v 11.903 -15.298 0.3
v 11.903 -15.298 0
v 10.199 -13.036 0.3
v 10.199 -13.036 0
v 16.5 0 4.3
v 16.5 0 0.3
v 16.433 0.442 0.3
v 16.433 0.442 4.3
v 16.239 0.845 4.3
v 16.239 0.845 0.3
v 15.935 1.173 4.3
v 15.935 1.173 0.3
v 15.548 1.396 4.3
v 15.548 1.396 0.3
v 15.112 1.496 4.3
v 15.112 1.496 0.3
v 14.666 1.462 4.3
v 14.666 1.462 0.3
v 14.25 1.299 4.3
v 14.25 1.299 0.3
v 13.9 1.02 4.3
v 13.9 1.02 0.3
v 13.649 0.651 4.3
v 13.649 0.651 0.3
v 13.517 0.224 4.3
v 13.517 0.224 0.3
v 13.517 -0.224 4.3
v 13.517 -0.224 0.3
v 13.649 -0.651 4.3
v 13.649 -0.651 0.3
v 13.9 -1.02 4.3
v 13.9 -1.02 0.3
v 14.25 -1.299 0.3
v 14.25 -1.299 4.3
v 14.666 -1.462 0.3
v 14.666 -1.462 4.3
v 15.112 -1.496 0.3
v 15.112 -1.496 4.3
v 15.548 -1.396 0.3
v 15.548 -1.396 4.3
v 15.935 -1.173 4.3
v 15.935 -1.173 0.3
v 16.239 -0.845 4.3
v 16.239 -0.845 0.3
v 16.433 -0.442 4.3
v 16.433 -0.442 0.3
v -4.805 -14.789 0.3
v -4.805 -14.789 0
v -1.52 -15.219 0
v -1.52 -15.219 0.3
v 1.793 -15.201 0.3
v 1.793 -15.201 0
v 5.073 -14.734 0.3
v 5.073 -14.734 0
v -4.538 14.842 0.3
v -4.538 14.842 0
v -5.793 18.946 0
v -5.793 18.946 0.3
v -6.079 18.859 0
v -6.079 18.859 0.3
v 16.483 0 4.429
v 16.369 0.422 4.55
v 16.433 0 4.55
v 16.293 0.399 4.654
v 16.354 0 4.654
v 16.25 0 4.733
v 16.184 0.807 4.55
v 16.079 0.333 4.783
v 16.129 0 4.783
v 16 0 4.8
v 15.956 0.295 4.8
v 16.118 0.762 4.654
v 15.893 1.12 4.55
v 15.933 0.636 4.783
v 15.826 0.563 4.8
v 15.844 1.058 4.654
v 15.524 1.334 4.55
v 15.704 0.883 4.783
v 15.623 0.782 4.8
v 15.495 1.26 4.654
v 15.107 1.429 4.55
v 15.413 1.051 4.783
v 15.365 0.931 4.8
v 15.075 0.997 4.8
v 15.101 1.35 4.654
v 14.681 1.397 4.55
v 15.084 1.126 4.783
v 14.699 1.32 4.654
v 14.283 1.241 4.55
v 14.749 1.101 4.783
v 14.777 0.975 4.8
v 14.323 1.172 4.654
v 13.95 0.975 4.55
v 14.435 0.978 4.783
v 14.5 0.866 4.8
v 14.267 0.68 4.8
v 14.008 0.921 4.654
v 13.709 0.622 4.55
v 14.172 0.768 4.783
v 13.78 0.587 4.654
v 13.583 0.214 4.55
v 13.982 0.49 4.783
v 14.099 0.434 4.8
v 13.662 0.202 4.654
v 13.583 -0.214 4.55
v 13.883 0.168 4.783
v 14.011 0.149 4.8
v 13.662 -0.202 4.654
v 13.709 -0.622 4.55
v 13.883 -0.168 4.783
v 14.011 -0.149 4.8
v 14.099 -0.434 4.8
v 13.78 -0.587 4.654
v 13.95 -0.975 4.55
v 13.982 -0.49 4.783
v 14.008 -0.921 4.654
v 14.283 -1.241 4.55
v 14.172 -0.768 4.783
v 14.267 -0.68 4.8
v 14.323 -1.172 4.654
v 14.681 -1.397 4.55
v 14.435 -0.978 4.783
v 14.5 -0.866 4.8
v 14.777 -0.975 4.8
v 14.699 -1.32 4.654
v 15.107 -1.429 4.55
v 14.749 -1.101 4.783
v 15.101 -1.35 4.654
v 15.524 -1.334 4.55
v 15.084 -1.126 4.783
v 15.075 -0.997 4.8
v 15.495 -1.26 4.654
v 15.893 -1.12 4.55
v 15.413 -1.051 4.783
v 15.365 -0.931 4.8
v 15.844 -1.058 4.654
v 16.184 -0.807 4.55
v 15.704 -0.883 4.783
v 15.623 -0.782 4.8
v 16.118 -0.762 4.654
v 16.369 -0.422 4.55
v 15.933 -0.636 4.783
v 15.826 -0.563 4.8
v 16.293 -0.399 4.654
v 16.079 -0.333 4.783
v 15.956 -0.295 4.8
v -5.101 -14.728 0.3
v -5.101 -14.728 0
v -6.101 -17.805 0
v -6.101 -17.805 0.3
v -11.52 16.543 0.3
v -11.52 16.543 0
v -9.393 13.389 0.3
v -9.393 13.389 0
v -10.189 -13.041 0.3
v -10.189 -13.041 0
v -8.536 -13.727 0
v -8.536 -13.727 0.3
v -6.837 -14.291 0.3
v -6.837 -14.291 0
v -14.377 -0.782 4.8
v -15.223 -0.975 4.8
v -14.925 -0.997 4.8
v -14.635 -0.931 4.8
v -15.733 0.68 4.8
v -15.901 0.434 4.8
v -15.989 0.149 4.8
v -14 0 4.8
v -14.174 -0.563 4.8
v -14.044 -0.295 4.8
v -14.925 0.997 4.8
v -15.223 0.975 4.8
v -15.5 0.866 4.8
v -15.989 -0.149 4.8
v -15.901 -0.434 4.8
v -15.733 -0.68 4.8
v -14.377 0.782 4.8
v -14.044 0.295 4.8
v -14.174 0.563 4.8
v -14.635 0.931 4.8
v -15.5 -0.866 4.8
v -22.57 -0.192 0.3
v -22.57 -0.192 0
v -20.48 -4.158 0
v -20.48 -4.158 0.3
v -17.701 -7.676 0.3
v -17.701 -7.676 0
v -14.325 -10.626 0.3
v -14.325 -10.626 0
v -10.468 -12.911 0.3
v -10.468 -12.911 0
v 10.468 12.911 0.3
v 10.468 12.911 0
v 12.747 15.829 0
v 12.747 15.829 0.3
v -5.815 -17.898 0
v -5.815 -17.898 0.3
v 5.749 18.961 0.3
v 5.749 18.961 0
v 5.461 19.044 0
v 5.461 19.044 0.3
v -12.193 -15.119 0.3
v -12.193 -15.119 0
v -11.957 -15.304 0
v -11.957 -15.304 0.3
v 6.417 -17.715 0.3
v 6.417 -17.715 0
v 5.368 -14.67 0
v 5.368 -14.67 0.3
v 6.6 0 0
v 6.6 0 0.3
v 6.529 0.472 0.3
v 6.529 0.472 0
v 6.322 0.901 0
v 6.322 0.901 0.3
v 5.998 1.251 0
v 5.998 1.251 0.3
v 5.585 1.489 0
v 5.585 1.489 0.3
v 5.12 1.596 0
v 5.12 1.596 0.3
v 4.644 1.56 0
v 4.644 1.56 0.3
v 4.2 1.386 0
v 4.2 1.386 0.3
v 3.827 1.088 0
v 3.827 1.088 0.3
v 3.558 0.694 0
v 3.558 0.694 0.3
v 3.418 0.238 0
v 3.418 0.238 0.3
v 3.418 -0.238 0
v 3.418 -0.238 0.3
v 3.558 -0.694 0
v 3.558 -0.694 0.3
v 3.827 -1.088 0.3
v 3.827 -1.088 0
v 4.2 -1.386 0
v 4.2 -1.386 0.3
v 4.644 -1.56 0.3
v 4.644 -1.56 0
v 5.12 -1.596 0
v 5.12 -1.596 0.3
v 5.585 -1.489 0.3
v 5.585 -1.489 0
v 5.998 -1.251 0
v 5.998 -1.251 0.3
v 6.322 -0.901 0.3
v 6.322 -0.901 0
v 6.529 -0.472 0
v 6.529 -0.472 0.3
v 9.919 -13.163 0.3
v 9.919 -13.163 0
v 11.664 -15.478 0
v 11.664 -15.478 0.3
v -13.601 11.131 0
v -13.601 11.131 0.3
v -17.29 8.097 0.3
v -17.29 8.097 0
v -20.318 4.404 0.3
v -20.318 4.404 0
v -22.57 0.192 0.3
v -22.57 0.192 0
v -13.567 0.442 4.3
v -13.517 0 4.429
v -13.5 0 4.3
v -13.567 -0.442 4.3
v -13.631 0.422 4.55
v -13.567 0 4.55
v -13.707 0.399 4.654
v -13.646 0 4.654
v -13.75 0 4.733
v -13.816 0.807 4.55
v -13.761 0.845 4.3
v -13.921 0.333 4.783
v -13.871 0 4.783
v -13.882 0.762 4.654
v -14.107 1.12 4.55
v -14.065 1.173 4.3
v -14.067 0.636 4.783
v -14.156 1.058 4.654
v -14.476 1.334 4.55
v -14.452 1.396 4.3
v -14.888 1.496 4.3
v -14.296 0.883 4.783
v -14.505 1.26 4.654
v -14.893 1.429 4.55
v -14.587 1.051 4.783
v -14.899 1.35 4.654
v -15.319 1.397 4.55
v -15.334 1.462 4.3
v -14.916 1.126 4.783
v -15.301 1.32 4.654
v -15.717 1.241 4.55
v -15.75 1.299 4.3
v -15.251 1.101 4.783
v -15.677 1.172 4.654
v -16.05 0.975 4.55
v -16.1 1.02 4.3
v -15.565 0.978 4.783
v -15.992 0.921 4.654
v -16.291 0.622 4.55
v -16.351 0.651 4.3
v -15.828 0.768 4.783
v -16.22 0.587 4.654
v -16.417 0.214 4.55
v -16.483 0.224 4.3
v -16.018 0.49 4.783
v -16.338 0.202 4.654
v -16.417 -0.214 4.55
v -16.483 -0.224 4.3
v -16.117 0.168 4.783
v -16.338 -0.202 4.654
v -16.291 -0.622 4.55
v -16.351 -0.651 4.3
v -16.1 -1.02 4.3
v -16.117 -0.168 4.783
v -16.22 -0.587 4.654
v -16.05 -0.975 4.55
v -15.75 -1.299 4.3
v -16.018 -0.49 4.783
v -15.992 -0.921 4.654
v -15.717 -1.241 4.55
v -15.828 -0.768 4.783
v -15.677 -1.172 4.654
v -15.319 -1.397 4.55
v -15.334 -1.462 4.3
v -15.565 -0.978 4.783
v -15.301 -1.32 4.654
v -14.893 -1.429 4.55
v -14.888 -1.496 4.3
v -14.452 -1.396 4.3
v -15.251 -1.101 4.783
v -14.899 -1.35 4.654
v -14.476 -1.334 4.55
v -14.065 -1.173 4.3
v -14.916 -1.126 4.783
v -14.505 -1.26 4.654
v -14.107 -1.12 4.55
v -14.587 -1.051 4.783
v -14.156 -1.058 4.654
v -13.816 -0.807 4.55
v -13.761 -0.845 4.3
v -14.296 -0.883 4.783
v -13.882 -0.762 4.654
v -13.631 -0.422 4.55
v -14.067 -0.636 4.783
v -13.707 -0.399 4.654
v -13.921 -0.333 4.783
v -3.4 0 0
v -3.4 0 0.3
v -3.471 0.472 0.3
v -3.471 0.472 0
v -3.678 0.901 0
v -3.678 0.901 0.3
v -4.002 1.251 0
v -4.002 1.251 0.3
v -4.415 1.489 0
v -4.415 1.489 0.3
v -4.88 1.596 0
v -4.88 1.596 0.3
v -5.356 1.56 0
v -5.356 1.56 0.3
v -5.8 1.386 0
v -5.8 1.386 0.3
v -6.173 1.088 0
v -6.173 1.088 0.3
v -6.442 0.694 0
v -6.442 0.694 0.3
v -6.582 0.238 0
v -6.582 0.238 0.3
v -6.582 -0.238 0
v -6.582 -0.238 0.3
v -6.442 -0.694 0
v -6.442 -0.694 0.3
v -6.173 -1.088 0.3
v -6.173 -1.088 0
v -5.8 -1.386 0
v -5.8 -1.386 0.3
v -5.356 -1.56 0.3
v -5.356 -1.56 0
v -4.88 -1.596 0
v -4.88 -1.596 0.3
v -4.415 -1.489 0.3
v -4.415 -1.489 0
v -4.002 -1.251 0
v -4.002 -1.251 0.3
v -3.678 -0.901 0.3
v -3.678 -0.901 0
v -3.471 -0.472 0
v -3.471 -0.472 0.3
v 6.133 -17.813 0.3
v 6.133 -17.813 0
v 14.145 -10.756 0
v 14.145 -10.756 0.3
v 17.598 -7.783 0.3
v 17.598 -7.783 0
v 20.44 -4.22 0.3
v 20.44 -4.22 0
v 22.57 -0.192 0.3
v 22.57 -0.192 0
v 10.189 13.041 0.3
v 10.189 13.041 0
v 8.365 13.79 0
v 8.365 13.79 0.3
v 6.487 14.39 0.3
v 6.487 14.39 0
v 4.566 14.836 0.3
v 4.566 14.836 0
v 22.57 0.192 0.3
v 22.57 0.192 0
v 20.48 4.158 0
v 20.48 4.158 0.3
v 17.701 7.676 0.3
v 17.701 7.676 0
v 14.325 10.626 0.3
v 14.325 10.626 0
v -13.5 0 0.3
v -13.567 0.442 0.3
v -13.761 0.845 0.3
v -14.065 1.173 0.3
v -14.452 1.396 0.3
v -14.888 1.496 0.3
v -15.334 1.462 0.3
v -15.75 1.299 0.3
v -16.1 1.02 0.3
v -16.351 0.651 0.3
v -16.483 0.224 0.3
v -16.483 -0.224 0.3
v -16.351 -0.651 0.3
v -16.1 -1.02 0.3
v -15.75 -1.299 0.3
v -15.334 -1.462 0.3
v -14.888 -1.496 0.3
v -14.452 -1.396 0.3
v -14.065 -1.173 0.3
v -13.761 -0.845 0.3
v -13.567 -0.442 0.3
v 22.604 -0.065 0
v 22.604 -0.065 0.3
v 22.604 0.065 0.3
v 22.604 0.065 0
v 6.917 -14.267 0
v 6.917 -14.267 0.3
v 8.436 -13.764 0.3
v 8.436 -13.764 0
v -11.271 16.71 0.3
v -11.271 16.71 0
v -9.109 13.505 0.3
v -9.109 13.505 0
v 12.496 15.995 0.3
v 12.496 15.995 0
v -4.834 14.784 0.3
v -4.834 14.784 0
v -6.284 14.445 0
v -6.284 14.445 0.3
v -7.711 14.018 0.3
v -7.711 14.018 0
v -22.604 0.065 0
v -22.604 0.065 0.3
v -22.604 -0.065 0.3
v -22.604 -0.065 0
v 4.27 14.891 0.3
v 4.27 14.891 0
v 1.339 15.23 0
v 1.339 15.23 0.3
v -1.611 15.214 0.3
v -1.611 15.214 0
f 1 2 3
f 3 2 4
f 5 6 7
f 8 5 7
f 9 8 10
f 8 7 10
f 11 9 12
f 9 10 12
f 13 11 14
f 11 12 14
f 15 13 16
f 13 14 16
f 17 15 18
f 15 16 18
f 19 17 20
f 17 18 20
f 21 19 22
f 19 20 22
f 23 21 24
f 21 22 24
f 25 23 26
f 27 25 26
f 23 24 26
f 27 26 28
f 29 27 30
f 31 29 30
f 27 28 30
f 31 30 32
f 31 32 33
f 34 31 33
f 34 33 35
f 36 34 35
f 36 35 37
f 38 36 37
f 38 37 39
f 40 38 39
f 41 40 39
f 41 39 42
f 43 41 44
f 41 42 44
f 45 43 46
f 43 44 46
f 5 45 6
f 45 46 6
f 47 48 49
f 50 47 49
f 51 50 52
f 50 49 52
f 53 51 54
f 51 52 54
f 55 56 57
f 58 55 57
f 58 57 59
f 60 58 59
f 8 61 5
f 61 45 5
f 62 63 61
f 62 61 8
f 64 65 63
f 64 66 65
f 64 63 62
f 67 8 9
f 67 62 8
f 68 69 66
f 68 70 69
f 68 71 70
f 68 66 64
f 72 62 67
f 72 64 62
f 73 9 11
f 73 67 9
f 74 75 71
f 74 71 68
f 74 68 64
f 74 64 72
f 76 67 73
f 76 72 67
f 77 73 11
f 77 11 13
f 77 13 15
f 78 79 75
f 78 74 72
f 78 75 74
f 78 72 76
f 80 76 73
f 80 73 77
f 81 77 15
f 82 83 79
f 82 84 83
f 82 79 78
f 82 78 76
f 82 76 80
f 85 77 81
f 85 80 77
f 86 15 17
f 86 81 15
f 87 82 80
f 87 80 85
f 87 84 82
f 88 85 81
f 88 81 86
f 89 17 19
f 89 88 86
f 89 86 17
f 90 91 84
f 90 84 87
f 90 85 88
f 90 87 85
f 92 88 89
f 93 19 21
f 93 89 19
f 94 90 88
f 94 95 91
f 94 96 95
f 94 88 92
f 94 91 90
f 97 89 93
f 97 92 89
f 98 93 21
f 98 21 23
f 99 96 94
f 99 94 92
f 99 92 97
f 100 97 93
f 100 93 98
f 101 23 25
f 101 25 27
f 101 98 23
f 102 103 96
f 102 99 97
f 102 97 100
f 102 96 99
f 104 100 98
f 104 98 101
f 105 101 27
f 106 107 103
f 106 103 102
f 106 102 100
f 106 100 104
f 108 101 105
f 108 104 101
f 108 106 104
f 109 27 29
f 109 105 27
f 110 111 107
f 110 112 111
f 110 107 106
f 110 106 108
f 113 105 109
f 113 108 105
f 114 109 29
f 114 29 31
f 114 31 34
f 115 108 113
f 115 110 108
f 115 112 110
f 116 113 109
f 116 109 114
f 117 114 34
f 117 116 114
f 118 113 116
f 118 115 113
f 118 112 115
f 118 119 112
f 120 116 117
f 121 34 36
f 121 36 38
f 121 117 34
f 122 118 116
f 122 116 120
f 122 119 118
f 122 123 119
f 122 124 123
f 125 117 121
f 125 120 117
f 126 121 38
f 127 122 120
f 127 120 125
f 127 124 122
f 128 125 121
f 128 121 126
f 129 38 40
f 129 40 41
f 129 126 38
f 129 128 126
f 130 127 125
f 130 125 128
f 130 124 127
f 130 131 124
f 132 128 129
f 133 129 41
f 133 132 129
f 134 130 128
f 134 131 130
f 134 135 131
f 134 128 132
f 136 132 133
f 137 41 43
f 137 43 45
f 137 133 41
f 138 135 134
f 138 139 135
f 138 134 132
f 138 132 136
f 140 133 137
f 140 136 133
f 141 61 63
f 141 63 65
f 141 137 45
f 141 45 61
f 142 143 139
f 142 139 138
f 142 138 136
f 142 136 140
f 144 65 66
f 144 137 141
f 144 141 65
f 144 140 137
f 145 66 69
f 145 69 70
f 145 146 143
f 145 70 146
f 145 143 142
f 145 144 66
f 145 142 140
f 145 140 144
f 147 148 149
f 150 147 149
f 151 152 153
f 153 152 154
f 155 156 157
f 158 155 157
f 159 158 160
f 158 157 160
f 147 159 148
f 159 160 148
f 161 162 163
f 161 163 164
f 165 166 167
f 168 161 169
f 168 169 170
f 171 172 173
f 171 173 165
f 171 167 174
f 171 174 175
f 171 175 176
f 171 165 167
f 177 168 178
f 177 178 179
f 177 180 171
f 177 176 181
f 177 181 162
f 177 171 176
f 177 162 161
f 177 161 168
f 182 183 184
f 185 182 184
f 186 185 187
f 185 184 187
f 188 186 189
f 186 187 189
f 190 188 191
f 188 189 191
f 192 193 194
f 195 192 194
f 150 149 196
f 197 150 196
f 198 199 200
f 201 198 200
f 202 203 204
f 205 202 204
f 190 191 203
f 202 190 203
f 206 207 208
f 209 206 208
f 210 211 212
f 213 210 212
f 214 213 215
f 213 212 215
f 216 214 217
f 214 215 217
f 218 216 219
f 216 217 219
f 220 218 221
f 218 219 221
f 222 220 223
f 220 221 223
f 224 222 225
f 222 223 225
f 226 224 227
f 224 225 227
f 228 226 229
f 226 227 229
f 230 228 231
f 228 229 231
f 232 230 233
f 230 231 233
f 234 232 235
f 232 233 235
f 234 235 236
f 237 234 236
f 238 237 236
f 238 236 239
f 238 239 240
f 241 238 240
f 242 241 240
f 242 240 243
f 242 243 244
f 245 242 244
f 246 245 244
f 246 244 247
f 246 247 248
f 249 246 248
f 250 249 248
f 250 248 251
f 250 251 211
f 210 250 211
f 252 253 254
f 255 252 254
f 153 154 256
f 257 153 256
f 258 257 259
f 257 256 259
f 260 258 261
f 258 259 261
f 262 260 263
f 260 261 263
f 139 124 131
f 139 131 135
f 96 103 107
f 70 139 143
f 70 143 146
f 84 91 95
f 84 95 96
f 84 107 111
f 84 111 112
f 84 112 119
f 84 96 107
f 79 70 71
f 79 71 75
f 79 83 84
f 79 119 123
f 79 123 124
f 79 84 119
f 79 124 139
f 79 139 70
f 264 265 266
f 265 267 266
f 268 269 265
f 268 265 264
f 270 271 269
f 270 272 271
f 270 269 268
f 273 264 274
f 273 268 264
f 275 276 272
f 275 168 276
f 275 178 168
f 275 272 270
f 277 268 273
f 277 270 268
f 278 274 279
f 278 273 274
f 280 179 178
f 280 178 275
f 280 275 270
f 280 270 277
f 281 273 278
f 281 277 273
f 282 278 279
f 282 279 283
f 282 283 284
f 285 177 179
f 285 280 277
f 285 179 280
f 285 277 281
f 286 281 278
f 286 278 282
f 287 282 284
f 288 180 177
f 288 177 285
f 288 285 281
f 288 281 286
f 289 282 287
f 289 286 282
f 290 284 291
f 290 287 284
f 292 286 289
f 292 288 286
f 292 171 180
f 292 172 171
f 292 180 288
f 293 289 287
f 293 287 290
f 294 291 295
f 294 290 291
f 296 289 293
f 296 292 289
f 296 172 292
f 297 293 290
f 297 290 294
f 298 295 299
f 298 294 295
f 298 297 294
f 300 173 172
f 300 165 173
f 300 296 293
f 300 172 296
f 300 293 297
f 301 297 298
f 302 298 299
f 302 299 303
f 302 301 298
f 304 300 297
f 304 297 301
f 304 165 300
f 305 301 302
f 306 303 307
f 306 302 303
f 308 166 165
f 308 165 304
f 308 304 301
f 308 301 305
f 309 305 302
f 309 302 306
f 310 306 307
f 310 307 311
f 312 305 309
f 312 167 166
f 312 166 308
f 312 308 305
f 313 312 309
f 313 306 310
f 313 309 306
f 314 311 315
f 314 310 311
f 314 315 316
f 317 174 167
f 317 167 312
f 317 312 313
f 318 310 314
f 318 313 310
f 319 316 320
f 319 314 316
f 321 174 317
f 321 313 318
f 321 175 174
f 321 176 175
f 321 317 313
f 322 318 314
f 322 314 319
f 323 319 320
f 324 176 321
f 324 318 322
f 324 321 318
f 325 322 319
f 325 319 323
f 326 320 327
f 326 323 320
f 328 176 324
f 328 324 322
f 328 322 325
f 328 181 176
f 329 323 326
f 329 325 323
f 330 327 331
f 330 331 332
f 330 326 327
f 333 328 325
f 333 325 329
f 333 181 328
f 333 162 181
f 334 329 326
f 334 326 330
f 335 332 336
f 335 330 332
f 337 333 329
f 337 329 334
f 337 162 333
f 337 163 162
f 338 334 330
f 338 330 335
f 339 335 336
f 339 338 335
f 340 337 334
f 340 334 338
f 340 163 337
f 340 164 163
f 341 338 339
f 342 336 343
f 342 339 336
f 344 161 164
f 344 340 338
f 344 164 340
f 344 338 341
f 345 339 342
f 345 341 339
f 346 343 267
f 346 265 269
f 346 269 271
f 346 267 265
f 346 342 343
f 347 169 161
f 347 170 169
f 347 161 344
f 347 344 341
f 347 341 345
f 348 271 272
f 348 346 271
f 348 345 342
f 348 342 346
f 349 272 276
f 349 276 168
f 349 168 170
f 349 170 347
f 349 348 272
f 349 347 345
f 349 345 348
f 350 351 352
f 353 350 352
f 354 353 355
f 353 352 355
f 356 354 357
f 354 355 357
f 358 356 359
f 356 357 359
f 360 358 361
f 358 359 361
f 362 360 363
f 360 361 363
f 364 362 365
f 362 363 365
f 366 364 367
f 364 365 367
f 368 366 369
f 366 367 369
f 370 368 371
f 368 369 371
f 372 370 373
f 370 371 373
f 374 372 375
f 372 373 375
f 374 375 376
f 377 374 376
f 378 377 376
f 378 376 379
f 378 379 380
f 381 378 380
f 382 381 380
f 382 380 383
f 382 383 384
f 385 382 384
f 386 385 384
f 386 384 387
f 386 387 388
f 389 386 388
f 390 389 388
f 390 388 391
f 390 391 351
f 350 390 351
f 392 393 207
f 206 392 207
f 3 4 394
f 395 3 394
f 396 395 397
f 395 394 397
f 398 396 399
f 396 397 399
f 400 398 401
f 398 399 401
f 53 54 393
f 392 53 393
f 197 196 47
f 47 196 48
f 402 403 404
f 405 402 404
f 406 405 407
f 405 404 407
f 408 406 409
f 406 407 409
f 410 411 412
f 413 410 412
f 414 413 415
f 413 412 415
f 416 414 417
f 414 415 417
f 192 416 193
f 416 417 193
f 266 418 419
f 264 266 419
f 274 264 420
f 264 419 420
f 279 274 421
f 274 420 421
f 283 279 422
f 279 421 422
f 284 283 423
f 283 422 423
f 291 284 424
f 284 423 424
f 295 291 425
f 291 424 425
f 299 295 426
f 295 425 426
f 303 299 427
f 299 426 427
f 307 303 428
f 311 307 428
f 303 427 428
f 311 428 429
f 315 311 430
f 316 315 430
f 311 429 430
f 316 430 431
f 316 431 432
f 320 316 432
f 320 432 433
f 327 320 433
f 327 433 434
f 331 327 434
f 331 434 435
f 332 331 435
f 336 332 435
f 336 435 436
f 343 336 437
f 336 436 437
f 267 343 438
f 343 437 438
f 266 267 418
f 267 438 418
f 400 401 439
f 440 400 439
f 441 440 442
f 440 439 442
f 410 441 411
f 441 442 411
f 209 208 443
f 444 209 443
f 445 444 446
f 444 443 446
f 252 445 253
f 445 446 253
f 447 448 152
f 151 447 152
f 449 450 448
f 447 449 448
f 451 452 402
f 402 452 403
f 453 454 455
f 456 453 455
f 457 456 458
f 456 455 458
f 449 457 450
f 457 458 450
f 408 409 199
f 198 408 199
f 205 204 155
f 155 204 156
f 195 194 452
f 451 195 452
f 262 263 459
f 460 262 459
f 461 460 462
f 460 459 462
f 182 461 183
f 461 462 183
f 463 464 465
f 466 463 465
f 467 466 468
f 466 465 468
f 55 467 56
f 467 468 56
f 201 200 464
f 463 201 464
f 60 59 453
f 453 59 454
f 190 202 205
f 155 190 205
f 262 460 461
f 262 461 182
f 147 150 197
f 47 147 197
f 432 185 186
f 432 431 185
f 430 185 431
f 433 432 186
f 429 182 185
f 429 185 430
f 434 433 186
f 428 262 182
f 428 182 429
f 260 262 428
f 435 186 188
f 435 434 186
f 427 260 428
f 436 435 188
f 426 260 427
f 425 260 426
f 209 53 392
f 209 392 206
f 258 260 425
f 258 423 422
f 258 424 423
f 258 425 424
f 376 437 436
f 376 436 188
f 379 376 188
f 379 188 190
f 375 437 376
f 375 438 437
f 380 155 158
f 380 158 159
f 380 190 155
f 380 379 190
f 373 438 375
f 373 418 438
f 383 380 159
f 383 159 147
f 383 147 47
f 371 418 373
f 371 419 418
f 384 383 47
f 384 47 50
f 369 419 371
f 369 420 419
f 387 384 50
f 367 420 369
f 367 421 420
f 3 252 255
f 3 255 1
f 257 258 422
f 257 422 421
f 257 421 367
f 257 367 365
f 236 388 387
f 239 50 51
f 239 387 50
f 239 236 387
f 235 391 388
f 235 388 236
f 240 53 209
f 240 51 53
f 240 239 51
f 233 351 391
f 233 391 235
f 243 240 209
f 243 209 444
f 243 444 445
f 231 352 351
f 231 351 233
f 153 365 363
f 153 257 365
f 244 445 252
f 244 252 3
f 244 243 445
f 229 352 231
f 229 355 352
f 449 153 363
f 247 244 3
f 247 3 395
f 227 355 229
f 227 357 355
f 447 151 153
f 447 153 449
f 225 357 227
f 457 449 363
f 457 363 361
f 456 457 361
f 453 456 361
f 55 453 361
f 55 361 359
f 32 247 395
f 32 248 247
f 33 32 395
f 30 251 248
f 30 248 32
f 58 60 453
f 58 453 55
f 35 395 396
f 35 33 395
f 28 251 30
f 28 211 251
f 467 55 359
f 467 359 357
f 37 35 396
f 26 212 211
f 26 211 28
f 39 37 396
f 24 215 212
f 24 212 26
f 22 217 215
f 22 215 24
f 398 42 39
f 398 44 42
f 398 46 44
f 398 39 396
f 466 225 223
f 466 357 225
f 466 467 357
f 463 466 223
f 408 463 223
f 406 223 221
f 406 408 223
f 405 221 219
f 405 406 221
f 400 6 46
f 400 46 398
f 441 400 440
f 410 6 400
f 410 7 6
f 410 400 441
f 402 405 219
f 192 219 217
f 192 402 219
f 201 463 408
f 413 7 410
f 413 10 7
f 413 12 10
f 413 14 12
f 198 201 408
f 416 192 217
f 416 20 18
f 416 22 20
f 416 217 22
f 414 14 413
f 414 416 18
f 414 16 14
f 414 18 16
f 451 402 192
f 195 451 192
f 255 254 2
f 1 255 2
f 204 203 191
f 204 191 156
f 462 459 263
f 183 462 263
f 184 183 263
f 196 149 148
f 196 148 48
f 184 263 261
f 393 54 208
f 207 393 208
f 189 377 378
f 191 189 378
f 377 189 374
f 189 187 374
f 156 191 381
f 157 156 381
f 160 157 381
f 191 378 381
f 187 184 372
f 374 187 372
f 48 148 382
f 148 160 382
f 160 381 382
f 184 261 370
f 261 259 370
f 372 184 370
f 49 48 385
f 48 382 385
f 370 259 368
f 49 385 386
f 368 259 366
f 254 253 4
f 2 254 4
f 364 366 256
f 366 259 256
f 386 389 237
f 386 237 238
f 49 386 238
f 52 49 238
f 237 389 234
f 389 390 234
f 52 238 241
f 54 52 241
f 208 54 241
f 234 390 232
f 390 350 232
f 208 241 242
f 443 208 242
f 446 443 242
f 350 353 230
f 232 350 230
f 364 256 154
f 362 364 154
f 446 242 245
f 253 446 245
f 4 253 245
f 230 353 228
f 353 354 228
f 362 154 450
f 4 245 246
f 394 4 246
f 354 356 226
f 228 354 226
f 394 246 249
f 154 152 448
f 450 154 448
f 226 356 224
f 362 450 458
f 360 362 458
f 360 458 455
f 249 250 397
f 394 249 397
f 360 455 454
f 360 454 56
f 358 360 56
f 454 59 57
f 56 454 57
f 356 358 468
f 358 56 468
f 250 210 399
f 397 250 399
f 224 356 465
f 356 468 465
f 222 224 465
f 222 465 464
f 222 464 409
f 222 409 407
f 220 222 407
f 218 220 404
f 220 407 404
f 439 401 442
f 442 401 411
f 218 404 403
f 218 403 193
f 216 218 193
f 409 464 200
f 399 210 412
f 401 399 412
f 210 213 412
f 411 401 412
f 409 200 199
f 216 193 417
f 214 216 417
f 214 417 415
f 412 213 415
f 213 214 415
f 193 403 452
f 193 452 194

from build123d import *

# Parameters (mm, degrees)
F3_DEPTH = 0.3
F4_R     = 1.6
F5_DEPTH = 0.301
F6_R     = 1.5
F7_DEPTH = 4.5
F8_R     = 0.5


with BuildPart() as f3:
    # F2 (on Top) → F3 (new body)
    with BuildSketch(Plane.XY):
        with BuildLine():
            ThreePointArc((22.5701665084, -0.1915041783), (22.6082940696, 0), (22.5701665084, 0.1915041783))
            ThreePointArc((22.5701665084, 0.1915041783), (17.7008675448, 7.675751982), (10.4677268379, 12.9107986006))
            Line((10.4677268379, 12.9107986006), (12.747458202, 15.8287216837))
            Line((12.747458202, 15.8287216837), (12.4964258145, 15.9946956536))
            Line((12.4964258145, 15.9946956536), (10.1887041195, 13.0409465807))
            ThreePointArc((10.1887041195, 13.0409465807), (7.4319060142, 14.1089547165), (4.5662963881, 14.8361813951))
            Line((4.5662963881, 14.8361813951), (5.7490812099, 18.9610422665))
            Line((5.7490812099, 18.9610422665), (5.4607027011, 19.0437334733))
            Line((5.4607027011, 19.0437334733), (4.2698358713, 14.8906872903))
            ThreePointArc((4.2698358713, 14.8906872903), (-0.1360819994, 15.2662877079), (-4.5375427655, 14.8416336361))
            Line((-4.5375427655, 14.8416336361), (-5.7925011179, 18.9464174492))
            Line((-5.7925011179, 18.9464174492), (-6.0793925447, 18.8587059378))
            Line((-6.0793925447, 18.8587059378), (-4.8335659928, 14.7837908983))
            ThreePointArc((-4.8335659928, 14.7837908983), (-7.0006877188, 14.2422664411), (-9.1092972105, 13.5050884949))
            Line((-9.1092972105, 13.5050884949), (-11.2713448253, 16.7104559006))
            Line((-11.2713448253, 16.7104559006), (-11.520056097, 16.5426980296))
            Line((-11.520056097, 16.5426980296), (-9.3929049937, 13.3890668296))
            ThreePointArc((-9.3929049937, 13.3890668296), (-17.2902689379, 8.0970055334), (-22.5701665084, 0.1915041783))
            ThreePointArc((-22.5701665084, 0.1915041783), (-22.6082940696, 0), (-22.5701665084, -0.1915041783))
            ThreePointArc((-22.5701665084, -0.1915041783), (-17.7008675448, -7.675751982), (-10.4677268379, -12.9107986006))
            Line((-10.4677268379, -12.9107986006), (-12.1931284822, -15.1192119975))
            Line((-12.1931284822, -15.1192119975), (-11.9567252562, -15.30391044))
            Line((-11.9567252562, -15.30391044), (-10.1887041195, -13.0409465807))
            ThreePointArc((-10.1887041195, -13.0409465807), (-7.69123576, -14.0245530137), (-5.1009446547, -14.7282729944))
            Line((-5.1009446547, -14.7282729944), (-6.1007225638, -17.8052730061))
            Line((-6.1007225638, -17.8052730061), (-5.8154056089, -17.8979781044))
            Line((-5.8154056089, -17.8979781044), (-4.8053870424, -14.7894605903))
            ThreePointArc((-4.8053870424, -14.7894605903), (0.1368174743, -15.2662836005), (5.0733720825, -14.7341423885))
            Line((5.0733720825, -14.7341423885), (6.1334205771, -17.8127467574))
            Line((6.1334205771, -17.8127467574), (6.4170761498, -17.7150763111))
            Line((6.4170761498, -17.7150763111), (5.3684350935, -14.6696015485))
            ThreePointArc((5.3684350935, -14.6696015485), (7.6806898276, -14.0280478509), (9.9188621728, -13.1627746827))
            Line((9.9188621728, -13.1627746827), (11.6638032097, -15.4783896498))
            Line((11.6638032097, -15.4783896498), (11.9033938627, -15.2978451429))
            Line((11.9033938627, -15.2978451429), (10.1991018341, -13.0361732318))
            ThreePointArc((10.1991018341, -13.0361732318), (17.5983697455, -7.7828218235), (22.5701665084, -0.1915041783))
        make_face()
    extrude(amount=F3_DEPTH)

    # F4 (on face) → F5 (cut, through all)
    with BuildSketch(Plane.XY.offset(0.3)):
        with Locations((5, 0)):
            Circle(F4_R)
        with Locations((-5, 0)):
            Circle(F4_R)
    extrude(amount=-F5_DEPTH, mode=Mode.SUBTRACT)

    # F6 (on face) → F7 (join)
    with BuildSketch(Plane.XY.offset(0.3)):
        with Locations((-15, 0)):
            Circle(F6_R)
        with Locations((15, 0)):
            Circle(F6_R)
    extrude(amount=F7_DEPTH)

    # F8
    f8_edges = [f3.edges().sort_by_distance(p)[0] for p in [
        (-16.5, 0, 4.8),
        (13.5, 0, 4.8),
    ]]
    fillet(f8_edges, radius=F8_R)


solid = f3.part
